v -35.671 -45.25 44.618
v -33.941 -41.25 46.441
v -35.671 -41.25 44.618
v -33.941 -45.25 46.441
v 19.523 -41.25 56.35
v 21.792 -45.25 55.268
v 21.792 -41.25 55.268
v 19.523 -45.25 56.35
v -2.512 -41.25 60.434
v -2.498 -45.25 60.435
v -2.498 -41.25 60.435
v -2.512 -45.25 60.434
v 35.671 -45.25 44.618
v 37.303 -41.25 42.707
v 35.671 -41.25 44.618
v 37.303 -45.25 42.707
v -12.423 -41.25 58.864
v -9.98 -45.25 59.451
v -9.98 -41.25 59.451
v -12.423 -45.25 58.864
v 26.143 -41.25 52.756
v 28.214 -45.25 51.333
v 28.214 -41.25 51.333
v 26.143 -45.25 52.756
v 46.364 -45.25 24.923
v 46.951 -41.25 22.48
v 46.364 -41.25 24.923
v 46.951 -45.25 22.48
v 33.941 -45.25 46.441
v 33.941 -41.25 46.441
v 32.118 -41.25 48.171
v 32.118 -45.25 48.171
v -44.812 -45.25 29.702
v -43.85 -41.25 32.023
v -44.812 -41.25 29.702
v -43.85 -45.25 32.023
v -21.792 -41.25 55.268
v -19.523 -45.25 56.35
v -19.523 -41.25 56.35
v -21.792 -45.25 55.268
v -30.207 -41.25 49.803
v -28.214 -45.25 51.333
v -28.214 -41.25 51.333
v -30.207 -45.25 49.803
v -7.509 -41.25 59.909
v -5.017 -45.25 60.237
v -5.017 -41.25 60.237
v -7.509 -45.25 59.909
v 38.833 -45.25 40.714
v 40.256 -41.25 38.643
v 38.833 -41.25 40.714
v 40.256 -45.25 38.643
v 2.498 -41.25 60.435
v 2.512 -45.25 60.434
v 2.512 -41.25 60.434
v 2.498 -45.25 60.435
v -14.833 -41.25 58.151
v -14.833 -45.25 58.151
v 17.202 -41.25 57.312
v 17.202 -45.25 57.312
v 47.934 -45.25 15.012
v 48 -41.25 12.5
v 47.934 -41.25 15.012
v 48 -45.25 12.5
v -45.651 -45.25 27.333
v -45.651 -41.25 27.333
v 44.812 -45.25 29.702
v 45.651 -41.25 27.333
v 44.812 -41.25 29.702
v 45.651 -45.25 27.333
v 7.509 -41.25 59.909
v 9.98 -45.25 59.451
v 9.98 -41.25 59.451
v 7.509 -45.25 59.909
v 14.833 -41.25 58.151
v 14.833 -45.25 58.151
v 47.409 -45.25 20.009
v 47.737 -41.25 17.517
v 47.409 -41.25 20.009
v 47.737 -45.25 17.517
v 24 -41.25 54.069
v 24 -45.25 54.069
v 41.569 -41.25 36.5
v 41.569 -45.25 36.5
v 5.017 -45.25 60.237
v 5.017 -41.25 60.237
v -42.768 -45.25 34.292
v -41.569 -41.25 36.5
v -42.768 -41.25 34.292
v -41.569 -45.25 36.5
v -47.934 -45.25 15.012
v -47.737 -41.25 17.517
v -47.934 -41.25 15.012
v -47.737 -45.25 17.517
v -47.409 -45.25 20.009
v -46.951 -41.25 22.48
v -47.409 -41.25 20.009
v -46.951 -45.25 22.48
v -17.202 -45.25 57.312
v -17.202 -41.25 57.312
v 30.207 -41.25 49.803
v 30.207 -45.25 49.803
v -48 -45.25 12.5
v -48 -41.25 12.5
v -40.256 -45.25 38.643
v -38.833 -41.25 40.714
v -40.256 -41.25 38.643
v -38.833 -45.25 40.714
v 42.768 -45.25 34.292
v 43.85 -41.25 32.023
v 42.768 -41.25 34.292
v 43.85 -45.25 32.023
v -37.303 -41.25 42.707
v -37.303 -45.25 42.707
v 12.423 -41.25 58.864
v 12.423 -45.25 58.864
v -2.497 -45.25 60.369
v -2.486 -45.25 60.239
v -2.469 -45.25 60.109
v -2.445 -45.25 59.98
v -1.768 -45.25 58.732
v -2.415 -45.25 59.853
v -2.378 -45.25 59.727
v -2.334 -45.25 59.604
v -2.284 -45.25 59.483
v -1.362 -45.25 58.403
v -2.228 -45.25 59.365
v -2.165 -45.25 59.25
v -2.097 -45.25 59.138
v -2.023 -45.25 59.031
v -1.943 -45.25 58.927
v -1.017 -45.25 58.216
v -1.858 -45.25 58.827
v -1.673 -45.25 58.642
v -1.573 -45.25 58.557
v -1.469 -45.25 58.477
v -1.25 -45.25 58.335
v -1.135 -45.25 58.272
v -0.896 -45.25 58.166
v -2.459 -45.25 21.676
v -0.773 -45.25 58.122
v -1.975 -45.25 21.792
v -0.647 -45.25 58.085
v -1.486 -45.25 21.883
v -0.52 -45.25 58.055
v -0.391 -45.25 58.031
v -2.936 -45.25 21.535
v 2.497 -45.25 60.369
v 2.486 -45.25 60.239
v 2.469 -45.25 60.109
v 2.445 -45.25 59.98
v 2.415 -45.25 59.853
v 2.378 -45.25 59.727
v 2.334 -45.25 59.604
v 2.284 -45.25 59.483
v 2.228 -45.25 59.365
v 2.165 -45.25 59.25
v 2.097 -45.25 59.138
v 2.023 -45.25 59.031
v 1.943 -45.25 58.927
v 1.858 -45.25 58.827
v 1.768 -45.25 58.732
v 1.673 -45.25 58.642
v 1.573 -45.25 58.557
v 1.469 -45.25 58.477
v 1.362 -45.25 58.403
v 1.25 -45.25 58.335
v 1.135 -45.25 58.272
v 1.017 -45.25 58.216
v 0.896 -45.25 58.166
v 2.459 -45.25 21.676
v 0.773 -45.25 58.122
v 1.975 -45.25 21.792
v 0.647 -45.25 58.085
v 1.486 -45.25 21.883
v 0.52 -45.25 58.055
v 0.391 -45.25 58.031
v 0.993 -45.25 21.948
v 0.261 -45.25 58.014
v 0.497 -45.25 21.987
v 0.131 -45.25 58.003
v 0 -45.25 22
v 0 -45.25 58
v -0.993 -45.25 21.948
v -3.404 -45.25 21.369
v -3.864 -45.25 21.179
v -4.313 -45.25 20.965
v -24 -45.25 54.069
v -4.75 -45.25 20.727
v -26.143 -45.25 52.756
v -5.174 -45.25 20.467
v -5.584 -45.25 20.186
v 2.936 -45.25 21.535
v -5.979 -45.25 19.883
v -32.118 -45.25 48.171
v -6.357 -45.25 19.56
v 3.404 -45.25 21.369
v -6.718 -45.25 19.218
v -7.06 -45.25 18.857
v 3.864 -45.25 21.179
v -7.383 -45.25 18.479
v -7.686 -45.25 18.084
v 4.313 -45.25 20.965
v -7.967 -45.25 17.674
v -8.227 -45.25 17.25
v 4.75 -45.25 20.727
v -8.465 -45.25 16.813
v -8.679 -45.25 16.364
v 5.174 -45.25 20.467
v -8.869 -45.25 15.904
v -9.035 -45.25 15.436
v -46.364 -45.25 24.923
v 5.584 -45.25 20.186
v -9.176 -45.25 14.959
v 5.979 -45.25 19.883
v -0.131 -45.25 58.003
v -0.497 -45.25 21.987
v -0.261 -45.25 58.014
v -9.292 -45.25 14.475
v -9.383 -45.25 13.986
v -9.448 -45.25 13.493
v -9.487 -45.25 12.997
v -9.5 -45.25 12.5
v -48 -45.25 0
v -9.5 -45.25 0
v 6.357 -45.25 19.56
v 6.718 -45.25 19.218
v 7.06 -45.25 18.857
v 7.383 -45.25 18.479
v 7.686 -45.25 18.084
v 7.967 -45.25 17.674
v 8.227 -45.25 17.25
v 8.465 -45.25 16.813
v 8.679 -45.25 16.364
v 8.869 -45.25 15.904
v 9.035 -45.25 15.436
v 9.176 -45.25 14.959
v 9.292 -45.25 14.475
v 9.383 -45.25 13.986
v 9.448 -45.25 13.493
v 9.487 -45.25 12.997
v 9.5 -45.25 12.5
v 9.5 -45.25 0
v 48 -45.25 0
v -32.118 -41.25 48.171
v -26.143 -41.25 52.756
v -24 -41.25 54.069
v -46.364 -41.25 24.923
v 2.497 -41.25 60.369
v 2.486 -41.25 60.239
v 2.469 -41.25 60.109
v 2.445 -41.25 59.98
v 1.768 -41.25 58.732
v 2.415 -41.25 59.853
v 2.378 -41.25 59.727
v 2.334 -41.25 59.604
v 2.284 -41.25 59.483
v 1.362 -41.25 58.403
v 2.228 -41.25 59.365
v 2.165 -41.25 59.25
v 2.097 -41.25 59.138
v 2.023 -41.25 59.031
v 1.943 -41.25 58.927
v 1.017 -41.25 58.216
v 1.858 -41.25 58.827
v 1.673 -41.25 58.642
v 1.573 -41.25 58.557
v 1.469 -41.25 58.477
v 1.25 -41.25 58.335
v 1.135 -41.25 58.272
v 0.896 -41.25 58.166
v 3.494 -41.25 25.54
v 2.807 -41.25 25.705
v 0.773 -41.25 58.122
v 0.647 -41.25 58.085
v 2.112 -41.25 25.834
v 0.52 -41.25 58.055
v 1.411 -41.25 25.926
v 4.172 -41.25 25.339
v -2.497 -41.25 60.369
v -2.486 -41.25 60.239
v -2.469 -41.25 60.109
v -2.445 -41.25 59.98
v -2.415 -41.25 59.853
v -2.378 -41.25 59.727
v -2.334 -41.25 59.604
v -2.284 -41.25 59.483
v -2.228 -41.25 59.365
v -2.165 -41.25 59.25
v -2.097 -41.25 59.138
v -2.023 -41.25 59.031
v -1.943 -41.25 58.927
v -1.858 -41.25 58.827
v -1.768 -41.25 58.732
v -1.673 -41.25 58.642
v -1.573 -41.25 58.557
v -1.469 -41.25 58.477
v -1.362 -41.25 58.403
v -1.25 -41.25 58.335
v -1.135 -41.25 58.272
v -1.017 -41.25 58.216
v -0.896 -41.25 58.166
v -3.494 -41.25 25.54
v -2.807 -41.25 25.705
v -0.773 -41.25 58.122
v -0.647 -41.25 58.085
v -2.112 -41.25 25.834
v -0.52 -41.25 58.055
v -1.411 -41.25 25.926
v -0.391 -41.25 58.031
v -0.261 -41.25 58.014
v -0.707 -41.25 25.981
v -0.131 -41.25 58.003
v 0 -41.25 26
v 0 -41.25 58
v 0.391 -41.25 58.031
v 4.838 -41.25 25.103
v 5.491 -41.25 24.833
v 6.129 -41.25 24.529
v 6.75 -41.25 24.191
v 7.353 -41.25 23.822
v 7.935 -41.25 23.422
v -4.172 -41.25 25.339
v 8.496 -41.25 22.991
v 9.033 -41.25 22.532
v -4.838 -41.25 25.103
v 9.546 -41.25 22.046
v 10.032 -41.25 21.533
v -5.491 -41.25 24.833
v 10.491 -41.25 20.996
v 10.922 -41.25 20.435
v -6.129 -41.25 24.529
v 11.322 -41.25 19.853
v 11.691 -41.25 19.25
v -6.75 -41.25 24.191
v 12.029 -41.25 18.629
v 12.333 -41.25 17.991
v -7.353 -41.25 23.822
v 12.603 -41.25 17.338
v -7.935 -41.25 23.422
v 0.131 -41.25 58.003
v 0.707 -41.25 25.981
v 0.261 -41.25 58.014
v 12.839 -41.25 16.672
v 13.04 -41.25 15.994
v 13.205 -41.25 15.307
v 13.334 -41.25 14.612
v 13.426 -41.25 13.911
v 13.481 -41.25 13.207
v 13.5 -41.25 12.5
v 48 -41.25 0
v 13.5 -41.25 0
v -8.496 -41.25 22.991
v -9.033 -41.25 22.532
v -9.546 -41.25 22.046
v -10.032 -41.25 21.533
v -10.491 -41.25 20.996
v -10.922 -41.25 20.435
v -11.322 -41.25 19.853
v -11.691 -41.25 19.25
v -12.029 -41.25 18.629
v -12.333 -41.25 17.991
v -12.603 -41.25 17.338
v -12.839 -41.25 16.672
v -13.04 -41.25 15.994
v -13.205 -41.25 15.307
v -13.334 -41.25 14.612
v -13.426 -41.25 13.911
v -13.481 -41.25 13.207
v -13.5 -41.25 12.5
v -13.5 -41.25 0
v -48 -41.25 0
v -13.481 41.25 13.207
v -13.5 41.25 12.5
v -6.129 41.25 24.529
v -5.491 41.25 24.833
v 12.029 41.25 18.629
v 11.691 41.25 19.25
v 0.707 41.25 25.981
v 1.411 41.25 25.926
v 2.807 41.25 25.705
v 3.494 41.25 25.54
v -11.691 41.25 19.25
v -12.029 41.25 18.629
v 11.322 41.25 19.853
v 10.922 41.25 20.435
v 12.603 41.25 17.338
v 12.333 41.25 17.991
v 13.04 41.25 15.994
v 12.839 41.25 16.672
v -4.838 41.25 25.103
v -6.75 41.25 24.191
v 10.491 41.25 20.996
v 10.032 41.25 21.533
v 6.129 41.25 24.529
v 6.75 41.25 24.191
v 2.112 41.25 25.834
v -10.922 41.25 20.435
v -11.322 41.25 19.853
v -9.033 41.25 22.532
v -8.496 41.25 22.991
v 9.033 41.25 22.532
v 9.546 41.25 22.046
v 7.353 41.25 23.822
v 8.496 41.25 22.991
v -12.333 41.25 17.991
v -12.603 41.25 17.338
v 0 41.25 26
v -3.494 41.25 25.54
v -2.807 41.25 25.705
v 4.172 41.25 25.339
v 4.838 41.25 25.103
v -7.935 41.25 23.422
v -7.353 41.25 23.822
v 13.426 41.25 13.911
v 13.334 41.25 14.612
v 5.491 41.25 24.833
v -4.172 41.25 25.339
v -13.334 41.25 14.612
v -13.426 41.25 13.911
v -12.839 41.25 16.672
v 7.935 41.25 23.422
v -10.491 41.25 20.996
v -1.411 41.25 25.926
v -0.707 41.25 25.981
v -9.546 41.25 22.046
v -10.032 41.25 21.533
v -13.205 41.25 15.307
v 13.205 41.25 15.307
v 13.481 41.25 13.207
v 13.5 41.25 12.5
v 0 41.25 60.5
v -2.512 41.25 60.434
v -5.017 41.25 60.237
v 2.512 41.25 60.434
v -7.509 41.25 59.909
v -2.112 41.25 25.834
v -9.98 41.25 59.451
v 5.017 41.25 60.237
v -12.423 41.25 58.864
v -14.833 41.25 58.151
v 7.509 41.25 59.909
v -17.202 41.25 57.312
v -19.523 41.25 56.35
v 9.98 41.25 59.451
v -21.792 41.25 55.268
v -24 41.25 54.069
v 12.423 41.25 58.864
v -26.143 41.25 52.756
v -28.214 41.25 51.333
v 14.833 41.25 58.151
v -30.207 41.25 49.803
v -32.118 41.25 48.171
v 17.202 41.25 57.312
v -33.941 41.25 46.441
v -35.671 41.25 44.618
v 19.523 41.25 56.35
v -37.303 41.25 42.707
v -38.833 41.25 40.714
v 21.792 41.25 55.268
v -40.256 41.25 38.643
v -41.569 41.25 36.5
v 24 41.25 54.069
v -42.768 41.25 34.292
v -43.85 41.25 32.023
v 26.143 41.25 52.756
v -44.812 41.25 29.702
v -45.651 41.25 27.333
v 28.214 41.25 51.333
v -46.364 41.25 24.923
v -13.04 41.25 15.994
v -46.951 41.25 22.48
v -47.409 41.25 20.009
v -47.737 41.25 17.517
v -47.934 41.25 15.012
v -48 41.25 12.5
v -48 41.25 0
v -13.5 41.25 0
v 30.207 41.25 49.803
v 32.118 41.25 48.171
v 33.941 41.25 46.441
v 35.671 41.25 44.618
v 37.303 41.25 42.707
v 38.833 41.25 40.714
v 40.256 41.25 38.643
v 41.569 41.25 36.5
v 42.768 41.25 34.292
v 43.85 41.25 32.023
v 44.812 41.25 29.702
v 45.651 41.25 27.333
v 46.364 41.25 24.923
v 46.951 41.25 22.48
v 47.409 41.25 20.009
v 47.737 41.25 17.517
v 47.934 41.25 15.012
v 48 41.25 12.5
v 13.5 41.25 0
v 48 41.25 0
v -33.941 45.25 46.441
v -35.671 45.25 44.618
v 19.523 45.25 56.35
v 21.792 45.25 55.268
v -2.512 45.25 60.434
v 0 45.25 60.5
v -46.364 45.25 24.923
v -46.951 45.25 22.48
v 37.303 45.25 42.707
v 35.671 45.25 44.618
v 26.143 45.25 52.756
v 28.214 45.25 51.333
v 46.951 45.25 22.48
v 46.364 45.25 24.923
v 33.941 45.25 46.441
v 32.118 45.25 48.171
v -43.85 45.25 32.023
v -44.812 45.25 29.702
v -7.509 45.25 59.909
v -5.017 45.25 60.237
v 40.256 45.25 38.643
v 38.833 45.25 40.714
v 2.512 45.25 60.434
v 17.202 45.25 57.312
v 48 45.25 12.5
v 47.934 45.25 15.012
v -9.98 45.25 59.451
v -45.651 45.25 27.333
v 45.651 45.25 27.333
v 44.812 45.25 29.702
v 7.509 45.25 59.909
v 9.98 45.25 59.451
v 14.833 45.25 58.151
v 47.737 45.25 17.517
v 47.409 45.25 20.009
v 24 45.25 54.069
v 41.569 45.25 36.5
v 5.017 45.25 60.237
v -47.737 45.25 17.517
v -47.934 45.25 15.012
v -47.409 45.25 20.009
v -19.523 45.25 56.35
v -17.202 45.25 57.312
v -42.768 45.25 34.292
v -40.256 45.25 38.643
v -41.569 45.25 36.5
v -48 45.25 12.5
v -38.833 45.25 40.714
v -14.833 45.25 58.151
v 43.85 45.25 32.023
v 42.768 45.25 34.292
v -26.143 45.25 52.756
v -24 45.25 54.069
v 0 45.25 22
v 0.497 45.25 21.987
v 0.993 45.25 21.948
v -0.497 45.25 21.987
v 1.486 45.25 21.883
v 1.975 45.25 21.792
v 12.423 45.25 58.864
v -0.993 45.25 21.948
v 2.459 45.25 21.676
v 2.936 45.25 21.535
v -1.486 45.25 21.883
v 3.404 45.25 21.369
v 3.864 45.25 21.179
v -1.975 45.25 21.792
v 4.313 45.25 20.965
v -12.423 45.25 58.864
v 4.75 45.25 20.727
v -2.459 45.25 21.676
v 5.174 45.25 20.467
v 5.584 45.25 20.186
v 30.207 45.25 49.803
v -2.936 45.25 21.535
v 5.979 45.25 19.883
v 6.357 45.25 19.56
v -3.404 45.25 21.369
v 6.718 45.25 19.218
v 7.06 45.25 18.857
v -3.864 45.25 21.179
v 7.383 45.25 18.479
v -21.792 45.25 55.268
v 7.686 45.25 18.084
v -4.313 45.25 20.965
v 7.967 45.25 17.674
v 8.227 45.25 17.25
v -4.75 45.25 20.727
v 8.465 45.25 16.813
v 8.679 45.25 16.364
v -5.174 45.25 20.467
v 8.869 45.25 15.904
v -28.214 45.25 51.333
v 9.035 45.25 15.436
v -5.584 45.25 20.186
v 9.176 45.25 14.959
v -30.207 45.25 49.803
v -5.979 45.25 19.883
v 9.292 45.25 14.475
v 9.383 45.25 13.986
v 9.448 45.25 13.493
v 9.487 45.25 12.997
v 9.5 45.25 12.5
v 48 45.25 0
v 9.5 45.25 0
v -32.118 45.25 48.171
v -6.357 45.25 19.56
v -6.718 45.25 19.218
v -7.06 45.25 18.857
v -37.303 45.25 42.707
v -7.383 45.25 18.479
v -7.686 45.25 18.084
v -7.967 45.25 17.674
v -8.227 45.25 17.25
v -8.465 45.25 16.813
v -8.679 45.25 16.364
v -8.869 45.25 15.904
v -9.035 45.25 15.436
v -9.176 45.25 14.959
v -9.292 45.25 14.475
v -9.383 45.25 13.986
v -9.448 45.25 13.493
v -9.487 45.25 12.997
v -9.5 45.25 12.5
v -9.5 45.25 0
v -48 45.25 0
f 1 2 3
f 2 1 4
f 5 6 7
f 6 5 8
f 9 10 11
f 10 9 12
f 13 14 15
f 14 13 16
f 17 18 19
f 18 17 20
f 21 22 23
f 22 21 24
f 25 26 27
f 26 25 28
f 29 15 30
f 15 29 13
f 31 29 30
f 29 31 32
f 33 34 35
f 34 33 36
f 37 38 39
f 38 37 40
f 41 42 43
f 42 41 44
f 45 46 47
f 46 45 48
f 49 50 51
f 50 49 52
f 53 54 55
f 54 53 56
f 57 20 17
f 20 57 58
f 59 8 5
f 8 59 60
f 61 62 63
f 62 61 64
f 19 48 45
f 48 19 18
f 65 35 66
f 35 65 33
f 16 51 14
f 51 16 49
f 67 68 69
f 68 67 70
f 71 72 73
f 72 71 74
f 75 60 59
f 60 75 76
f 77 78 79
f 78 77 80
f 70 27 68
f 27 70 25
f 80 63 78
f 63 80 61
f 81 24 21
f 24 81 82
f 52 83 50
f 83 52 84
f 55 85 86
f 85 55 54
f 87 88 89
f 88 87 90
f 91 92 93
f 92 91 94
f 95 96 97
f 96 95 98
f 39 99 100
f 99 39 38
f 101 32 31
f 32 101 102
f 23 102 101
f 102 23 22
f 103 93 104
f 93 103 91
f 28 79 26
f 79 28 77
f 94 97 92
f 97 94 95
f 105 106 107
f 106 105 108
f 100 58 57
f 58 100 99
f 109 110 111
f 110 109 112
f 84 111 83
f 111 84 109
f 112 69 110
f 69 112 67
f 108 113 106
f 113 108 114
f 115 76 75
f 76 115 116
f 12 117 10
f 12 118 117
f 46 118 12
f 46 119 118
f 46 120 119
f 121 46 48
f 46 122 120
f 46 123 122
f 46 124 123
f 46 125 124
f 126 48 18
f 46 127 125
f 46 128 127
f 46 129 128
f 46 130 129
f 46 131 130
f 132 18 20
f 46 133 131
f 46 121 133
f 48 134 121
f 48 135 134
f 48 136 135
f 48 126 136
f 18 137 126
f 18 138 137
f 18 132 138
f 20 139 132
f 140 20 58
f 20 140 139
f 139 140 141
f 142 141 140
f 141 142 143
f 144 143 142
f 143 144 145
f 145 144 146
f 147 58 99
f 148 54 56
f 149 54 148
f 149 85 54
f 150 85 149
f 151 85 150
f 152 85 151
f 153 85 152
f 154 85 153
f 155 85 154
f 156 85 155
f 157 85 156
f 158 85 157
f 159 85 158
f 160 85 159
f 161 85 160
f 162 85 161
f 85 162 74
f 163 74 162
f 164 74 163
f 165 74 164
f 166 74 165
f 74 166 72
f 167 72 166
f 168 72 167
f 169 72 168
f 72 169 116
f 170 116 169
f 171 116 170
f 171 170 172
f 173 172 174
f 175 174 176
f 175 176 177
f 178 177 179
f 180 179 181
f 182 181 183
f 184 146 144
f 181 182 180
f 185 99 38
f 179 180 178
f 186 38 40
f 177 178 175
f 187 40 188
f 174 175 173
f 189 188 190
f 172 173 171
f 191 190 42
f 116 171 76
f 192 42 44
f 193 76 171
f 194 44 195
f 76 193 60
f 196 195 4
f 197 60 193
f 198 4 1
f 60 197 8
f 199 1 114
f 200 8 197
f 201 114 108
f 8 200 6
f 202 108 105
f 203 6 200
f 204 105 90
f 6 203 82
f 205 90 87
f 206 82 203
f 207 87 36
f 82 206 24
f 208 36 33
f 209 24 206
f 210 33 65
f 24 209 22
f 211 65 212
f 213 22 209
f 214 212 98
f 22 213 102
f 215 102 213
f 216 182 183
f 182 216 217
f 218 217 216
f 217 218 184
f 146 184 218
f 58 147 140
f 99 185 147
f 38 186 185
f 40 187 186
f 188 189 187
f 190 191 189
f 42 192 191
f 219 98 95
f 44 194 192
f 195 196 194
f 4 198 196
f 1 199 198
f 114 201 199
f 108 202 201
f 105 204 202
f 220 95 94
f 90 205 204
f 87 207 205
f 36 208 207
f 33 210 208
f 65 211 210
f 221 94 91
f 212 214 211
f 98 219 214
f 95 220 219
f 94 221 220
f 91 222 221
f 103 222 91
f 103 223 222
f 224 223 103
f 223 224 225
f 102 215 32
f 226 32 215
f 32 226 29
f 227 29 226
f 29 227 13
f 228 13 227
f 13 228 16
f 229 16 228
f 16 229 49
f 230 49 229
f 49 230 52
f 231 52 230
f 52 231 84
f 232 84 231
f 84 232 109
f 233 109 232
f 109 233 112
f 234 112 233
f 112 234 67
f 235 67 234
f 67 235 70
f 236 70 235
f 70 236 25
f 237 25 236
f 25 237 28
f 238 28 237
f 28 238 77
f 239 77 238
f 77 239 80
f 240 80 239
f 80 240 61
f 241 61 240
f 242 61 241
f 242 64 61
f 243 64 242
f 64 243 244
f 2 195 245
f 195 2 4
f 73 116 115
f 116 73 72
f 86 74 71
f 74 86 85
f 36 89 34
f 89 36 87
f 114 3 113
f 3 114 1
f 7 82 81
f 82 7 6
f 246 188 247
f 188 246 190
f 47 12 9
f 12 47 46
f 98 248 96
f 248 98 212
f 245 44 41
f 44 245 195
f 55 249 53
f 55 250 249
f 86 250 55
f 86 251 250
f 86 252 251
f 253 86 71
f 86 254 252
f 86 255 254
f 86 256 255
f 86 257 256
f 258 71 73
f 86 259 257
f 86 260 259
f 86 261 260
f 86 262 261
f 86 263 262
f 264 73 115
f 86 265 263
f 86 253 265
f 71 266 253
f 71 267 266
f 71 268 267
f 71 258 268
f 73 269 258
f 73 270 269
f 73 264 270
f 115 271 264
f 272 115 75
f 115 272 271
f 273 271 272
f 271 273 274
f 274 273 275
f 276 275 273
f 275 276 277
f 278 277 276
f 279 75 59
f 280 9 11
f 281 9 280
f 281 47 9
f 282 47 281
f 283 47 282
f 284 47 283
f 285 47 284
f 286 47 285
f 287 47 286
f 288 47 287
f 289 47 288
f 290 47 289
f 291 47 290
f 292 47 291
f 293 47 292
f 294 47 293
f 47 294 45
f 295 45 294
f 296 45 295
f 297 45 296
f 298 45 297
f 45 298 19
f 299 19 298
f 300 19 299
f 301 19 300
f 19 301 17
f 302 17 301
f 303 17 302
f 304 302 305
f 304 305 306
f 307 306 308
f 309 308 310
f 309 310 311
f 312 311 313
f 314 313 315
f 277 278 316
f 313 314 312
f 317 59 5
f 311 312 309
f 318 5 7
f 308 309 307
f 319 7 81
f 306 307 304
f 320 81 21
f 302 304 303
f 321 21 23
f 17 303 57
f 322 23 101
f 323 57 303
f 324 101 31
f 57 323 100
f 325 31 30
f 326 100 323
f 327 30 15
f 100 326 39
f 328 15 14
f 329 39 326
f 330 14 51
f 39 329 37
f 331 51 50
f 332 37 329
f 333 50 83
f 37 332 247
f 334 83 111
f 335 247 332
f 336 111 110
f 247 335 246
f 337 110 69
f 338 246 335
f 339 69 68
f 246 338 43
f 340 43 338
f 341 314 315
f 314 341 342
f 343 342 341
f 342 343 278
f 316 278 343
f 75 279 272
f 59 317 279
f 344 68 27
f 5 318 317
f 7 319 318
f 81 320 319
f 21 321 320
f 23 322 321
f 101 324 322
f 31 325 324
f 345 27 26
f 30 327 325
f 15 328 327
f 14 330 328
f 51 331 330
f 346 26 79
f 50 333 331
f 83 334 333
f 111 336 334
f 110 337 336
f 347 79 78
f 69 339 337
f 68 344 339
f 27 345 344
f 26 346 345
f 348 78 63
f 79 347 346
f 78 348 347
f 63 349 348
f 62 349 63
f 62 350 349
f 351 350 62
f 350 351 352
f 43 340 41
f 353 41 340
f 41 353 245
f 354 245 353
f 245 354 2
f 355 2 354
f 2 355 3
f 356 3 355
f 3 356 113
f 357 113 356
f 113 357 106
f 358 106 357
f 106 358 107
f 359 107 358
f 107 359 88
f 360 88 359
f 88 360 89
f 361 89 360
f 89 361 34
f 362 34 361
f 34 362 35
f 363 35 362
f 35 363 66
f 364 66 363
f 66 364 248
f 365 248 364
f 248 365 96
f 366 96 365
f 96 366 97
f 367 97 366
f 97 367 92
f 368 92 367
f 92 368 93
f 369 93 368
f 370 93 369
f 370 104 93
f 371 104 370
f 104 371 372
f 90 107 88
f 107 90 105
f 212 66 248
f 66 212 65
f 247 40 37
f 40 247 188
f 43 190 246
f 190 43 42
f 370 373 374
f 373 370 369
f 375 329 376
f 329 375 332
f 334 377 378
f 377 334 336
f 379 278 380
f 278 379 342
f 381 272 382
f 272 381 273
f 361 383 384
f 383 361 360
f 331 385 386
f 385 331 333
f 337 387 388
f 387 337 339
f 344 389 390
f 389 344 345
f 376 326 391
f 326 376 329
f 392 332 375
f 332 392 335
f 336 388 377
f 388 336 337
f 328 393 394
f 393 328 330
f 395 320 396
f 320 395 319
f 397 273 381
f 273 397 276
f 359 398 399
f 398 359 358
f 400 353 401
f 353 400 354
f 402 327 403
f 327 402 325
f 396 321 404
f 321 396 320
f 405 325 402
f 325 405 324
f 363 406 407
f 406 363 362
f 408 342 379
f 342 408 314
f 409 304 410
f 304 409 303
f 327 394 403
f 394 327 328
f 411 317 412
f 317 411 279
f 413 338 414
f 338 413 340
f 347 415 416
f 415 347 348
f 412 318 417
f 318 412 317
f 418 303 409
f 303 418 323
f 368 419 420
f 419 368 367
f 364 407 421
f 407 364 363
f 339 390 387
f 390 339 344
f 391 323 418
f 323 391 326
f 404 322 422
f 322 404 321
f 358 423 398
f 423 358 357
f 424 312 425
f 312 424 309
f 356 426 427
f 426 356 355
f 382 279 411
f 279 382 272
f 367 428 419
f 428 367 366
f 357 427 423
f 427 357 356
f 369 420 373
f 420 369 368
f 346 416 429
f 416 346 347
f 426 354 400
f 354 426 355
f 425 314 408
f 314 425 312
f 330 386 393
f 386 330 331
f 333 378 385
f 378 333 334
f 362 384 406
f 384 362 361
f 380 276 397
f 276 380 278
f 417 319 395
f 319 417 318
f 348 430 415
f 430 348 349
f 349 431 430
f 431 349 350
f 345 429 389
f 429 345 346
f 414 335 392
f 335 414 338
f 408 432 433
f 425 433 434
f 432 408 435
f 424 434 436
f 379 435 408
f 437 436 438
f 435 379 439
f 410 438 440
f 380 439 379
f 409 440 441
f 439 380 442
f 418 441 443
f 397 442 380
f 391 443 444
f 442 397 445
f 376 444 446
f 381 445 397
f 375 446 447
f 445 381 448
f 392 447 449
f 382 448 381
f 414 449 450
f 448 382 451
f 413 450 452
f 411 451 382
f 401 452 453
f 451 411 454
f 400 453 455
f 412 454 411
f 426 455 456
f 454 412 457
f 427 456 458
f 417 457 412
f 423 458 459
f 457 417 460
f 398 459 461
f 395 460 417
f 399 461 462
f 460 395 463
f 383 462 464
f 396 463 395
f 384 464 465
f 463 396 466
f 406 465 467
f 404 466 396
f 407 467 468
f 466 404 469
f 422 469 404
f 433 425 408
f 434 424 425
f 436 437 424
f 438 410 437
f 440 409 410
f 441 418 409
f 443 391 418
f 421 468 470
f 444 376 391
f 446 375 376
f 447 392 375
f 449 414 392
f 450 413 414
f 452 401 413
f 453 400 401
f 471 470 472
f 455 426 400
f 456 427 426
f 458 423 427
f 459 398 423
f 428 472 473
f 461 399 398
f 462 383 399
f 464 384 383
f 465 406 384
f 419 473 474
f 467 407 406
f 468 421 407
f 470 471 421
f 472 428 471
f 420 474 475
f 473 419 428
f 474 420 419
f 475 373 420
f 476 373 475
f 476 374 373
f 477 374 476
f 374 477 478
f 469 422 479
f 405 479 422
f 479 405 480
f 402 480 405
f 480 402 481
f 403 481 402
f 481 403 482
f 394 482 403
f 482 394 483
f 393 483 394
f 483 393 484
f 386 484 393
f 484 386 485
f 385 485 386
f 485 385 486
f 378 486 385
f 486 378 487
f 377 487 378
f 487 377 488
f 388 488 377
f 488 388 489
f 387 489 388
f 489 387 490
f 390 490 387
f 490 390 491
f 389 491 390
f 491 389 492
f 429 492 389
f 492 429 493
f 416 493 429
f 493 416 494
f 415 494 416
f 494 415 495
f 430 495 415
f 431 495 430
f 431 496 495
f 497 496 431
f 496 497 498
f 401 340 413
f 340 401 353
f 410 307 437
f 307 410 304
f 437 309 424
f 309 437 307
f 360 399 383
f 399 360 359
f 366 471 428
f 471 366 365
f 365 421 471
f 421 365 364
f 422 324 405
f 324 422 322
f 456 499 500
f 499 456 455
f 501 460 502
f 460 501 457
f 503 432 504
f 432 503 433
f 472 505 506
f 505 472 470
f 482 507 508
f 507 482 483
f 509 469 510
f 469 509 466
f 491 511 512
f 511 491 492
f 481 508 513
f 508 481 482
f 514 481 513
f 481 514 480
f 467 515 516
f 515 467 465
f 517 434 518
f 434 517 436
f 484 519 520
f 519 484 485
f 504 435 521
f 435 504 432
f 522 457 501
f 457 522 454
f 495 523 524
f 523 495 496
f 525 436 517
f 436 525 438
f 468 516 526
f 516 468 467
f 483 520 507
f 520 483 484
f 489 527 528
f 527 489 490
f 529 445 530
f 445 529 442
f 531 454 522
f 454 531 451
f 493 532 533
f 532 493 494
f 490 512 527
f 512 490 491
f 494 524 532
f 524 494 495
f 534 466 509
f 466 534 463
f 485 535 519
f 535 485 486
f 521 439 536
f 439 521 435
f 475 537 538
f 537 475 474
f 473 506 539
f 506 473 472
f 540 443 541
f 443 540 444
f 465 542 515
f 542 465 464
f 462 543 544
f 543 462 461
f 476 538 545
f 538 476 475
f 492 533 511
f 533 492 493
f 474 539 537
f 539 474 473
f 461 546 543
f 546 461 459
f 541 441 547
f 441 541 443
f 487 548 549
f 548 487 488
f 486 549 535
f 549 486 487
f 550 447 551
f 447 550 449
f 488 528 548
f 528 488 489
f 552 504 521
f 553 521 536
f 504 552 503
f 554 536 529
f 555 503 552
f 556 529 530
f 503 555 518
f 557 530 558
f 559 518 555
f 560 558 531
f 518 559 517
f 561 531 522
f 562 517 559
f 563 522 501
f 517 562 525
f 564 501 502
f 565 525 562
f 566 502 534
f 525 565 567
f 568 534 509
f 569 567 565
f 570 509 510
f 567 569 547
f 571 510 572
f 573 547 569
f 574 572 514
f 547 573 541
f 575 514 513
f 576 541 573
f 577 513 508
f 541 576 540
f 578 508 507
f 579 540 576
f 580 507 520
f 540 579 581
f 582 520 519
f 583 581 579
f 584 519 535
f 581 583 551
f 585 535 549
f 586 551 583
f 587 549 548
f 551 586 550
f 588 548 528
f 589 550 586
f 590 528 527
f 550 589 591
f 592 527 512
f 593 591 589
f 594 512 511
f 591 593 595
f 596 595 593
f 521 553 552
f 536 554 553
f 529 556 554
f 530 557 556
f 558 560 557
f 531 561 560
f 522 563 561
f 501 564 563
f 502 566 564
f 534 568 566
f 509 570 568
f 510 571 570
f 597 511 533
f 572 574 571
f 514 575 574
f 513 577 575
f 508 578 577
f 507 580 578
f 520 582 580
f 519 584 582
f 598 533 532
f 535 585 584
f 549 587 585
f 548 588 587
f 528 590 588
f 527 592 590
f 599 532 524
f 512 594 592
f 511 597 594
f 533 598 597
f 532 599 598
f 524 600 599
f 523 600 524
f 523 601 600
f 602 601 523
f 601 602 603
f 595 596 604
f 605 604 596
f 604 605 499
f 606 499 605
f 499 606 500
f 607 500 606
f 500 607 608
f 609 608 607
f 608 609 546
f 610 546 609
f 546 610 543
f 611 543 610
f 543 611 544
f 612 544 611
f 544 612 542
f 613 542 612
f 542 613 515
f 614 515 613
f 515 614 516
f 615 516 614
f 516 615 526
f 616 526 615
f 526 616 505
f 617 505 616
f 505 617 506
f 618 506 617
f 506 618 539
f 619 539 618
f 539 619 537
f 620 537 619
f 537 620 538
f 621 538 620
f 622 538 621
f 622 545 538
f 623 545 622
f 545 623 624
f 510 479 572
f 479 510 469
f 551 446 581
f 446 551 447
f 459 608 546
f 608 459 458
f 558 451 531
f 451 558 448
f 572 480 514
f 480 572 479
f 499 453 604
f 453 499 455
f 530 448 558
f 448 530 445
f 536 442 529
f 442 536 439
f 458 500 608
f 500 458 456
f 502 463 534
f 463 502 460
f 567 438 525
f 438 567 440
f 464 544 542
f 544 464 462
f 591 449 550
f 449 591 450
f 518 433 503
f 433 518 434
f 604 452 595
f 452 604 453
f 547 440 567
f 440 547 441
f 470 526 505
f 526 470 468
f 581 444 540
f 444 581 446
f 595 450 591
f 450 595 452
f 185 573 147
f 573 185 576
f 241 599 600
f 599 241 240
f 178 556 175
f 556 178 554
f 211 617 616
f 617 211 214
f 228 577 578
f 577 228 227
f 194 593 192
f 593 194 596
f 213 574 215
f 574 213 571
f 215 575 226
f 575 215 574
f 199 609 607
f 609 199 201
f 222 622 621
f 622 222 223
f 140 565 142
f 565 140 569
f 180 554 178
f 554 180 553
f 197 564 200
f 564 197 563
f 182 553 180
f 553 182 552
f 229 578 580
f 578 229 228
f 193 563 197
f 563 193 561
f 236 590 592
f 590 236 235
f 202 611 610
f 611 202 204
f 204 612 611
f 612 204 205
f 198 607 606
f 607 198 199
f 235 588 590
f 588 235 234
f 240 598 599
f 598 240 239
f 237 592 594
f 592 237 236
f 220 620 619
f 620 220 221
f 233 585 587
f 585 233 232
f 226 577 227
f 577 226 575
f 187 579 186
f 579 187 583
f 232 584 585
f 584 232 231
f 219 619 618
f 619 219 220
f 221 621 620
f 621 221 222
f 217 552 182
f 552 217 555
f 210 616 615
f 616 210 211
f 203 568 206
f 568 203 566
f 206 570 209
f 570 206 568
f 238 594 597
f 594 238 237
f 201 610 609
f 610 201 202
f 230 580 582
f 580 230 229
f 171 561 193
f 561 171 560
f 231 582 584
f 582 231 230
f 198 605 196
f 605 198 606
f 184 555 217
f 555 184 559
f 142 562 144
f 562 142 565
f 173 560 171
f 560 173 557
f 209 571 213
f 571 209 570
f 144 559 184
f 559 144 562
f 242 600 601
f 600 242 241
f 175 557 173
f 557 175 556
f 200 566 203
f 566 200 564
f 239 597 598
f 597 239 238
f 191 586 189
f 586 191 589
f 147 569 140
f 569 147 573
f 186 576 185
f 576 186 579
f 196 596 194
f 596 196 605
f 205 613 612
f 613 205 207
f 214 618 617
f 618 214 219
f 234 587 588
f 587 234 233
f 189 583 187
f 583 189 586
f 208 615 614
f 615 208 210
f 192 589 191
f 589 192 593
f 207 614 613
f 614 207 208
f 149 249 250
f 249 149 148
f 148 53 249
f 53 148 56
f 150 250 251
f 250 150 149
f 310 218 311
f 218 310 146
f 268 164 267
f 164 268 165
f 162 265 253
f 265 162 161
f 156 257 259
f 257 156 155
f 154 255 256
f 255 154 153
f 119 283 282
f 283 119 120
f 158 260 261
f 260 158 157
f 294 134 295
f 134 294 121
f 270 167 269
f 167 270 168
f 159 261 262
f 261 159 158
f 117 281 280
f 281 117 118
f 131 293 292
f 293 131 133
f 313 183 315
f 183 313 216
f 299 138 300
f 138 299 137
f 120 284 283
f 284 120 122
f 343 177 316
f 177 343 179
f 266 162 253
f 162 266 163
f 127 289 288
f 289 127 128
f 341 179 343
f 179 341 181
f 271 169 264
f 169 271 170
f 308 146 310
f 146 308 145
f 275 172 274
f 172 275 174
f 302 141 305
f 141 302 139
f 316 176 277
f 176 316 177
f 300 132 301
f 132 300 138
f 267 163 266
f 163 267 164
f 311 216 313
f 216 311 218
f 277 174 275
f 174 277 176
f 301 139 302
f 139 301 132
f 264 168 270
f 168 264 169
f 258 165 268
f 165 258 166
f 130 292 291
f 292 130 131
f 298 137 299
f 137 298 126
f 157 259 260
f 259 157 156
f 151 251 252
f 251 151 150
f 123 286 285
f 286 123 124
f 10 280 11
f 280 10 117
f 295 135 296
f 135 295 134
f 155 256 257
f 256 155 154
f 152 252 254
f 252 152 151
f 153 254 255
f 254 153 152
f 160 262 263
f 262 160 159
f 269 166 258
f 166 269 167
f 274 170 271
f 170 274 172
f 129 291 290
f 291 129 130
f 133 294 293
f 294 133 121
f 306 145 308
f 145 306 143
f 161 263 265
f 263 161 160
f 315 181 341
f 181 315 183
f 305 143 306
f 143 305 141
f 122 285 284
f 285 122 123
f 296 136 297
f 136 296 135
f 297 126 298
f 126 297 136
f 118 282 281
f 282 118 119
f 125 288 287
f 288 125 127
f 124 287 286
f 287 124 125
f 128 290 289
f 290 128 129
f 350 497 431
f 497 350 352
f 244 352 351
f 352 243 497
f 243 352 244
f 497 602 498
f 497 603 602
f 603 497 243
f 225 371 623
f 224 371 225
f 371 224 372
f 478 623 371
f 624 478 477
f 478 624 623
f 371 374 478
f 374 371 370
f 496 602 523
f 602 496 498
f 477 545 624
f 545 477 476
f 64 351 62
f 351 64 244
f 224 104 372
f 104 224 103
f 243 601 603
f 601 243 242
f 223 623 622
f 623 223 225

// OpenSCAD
// Parametric filament spool by Woale

// preview[view:south, tilt:top diagonal]

// What's the inner spool width ? Recommended >10mm.
//spool_radius = 44.5;    // for smaller 4+1 coils
spool_radius = 48;    // for larger 7+1 coils

// What's the height of the wire-carrying part of the spool?
spool_height = 82.5;

// What's the (inner) radius of spool's core?
spool_hole_radius = 9.5;

// How thick should the walls (the top and bottom discs and the core) be?
wall_thickness = 4;

// How wide should the rectangular extension be? Use 0 for a cylindrical spool
rectangular_width = 25;

// How large should the winding inset be? Use 0 for no inset
inset_radius = 2.5;

$fn=120;

union() {
    translate([0,-spool_height/2-wall_thickness,rectangular_width/2]) 
    rotate([-90,0,0])
    difference() {
        union() {
            cylinder(h=wall_thickness, r=spool_radius);
            cylinder(h=wall_thickness+spool_height, r=spool_hole_radius+wall_thickness);
            translate([0, 0, wall_thickness+spool_height])
                cylinder(h=wall_thickness, r=spool_radius);
        }
        
        translate([0,0,-1]) 
            cylinder(h=wall_thickness+2*spool_height+2, r=spool_hole_radius);
        translate([0,-spool_radius,-1])
            cylinder(h=wall_thickness+spool_height, r=inset_radius);

        // and remove half of the cylinder to create the printable half-spool
        translate([-spool_radius-1,0,-1])
            cube([2*spool_radius+2, spool_radius+2, spool_height+2*wall_thickness+2]);
    }

    difference() {
        union() {
        translate([-spool_hole_radius-wall_thickness,-spool_height/2-wall_thickness,0])
            cube([2*(spool_hole_radius + wall_thickness),spool_height+2*wall_thickness,rectangular_width/2]);
        translate([-spool_radius,spool_height/2,0])
            cube([2*spool_radius,wall_thickness,rectangular_width/2]);
        translate([-spool_radius,-spool_height/2-wall_thickness,0])
            cube([2*spool_radius,wall_thickness,rectangular_width/2]);
        }
        
        // here we're adding just 1.1 to the height of the cube because, while a 1mm offset
        // below the XY-plane is fine, we don't want to make any appreciable cuts into the
        // spool's core
        translate([-spool_hole_radius,-spool_height/2-wall_thickness-1,-1])
            cube([2*spool_hole_radius,spool_height+2*wall_thickness+2,rectangular_width/2+1.1]);
    }
}
